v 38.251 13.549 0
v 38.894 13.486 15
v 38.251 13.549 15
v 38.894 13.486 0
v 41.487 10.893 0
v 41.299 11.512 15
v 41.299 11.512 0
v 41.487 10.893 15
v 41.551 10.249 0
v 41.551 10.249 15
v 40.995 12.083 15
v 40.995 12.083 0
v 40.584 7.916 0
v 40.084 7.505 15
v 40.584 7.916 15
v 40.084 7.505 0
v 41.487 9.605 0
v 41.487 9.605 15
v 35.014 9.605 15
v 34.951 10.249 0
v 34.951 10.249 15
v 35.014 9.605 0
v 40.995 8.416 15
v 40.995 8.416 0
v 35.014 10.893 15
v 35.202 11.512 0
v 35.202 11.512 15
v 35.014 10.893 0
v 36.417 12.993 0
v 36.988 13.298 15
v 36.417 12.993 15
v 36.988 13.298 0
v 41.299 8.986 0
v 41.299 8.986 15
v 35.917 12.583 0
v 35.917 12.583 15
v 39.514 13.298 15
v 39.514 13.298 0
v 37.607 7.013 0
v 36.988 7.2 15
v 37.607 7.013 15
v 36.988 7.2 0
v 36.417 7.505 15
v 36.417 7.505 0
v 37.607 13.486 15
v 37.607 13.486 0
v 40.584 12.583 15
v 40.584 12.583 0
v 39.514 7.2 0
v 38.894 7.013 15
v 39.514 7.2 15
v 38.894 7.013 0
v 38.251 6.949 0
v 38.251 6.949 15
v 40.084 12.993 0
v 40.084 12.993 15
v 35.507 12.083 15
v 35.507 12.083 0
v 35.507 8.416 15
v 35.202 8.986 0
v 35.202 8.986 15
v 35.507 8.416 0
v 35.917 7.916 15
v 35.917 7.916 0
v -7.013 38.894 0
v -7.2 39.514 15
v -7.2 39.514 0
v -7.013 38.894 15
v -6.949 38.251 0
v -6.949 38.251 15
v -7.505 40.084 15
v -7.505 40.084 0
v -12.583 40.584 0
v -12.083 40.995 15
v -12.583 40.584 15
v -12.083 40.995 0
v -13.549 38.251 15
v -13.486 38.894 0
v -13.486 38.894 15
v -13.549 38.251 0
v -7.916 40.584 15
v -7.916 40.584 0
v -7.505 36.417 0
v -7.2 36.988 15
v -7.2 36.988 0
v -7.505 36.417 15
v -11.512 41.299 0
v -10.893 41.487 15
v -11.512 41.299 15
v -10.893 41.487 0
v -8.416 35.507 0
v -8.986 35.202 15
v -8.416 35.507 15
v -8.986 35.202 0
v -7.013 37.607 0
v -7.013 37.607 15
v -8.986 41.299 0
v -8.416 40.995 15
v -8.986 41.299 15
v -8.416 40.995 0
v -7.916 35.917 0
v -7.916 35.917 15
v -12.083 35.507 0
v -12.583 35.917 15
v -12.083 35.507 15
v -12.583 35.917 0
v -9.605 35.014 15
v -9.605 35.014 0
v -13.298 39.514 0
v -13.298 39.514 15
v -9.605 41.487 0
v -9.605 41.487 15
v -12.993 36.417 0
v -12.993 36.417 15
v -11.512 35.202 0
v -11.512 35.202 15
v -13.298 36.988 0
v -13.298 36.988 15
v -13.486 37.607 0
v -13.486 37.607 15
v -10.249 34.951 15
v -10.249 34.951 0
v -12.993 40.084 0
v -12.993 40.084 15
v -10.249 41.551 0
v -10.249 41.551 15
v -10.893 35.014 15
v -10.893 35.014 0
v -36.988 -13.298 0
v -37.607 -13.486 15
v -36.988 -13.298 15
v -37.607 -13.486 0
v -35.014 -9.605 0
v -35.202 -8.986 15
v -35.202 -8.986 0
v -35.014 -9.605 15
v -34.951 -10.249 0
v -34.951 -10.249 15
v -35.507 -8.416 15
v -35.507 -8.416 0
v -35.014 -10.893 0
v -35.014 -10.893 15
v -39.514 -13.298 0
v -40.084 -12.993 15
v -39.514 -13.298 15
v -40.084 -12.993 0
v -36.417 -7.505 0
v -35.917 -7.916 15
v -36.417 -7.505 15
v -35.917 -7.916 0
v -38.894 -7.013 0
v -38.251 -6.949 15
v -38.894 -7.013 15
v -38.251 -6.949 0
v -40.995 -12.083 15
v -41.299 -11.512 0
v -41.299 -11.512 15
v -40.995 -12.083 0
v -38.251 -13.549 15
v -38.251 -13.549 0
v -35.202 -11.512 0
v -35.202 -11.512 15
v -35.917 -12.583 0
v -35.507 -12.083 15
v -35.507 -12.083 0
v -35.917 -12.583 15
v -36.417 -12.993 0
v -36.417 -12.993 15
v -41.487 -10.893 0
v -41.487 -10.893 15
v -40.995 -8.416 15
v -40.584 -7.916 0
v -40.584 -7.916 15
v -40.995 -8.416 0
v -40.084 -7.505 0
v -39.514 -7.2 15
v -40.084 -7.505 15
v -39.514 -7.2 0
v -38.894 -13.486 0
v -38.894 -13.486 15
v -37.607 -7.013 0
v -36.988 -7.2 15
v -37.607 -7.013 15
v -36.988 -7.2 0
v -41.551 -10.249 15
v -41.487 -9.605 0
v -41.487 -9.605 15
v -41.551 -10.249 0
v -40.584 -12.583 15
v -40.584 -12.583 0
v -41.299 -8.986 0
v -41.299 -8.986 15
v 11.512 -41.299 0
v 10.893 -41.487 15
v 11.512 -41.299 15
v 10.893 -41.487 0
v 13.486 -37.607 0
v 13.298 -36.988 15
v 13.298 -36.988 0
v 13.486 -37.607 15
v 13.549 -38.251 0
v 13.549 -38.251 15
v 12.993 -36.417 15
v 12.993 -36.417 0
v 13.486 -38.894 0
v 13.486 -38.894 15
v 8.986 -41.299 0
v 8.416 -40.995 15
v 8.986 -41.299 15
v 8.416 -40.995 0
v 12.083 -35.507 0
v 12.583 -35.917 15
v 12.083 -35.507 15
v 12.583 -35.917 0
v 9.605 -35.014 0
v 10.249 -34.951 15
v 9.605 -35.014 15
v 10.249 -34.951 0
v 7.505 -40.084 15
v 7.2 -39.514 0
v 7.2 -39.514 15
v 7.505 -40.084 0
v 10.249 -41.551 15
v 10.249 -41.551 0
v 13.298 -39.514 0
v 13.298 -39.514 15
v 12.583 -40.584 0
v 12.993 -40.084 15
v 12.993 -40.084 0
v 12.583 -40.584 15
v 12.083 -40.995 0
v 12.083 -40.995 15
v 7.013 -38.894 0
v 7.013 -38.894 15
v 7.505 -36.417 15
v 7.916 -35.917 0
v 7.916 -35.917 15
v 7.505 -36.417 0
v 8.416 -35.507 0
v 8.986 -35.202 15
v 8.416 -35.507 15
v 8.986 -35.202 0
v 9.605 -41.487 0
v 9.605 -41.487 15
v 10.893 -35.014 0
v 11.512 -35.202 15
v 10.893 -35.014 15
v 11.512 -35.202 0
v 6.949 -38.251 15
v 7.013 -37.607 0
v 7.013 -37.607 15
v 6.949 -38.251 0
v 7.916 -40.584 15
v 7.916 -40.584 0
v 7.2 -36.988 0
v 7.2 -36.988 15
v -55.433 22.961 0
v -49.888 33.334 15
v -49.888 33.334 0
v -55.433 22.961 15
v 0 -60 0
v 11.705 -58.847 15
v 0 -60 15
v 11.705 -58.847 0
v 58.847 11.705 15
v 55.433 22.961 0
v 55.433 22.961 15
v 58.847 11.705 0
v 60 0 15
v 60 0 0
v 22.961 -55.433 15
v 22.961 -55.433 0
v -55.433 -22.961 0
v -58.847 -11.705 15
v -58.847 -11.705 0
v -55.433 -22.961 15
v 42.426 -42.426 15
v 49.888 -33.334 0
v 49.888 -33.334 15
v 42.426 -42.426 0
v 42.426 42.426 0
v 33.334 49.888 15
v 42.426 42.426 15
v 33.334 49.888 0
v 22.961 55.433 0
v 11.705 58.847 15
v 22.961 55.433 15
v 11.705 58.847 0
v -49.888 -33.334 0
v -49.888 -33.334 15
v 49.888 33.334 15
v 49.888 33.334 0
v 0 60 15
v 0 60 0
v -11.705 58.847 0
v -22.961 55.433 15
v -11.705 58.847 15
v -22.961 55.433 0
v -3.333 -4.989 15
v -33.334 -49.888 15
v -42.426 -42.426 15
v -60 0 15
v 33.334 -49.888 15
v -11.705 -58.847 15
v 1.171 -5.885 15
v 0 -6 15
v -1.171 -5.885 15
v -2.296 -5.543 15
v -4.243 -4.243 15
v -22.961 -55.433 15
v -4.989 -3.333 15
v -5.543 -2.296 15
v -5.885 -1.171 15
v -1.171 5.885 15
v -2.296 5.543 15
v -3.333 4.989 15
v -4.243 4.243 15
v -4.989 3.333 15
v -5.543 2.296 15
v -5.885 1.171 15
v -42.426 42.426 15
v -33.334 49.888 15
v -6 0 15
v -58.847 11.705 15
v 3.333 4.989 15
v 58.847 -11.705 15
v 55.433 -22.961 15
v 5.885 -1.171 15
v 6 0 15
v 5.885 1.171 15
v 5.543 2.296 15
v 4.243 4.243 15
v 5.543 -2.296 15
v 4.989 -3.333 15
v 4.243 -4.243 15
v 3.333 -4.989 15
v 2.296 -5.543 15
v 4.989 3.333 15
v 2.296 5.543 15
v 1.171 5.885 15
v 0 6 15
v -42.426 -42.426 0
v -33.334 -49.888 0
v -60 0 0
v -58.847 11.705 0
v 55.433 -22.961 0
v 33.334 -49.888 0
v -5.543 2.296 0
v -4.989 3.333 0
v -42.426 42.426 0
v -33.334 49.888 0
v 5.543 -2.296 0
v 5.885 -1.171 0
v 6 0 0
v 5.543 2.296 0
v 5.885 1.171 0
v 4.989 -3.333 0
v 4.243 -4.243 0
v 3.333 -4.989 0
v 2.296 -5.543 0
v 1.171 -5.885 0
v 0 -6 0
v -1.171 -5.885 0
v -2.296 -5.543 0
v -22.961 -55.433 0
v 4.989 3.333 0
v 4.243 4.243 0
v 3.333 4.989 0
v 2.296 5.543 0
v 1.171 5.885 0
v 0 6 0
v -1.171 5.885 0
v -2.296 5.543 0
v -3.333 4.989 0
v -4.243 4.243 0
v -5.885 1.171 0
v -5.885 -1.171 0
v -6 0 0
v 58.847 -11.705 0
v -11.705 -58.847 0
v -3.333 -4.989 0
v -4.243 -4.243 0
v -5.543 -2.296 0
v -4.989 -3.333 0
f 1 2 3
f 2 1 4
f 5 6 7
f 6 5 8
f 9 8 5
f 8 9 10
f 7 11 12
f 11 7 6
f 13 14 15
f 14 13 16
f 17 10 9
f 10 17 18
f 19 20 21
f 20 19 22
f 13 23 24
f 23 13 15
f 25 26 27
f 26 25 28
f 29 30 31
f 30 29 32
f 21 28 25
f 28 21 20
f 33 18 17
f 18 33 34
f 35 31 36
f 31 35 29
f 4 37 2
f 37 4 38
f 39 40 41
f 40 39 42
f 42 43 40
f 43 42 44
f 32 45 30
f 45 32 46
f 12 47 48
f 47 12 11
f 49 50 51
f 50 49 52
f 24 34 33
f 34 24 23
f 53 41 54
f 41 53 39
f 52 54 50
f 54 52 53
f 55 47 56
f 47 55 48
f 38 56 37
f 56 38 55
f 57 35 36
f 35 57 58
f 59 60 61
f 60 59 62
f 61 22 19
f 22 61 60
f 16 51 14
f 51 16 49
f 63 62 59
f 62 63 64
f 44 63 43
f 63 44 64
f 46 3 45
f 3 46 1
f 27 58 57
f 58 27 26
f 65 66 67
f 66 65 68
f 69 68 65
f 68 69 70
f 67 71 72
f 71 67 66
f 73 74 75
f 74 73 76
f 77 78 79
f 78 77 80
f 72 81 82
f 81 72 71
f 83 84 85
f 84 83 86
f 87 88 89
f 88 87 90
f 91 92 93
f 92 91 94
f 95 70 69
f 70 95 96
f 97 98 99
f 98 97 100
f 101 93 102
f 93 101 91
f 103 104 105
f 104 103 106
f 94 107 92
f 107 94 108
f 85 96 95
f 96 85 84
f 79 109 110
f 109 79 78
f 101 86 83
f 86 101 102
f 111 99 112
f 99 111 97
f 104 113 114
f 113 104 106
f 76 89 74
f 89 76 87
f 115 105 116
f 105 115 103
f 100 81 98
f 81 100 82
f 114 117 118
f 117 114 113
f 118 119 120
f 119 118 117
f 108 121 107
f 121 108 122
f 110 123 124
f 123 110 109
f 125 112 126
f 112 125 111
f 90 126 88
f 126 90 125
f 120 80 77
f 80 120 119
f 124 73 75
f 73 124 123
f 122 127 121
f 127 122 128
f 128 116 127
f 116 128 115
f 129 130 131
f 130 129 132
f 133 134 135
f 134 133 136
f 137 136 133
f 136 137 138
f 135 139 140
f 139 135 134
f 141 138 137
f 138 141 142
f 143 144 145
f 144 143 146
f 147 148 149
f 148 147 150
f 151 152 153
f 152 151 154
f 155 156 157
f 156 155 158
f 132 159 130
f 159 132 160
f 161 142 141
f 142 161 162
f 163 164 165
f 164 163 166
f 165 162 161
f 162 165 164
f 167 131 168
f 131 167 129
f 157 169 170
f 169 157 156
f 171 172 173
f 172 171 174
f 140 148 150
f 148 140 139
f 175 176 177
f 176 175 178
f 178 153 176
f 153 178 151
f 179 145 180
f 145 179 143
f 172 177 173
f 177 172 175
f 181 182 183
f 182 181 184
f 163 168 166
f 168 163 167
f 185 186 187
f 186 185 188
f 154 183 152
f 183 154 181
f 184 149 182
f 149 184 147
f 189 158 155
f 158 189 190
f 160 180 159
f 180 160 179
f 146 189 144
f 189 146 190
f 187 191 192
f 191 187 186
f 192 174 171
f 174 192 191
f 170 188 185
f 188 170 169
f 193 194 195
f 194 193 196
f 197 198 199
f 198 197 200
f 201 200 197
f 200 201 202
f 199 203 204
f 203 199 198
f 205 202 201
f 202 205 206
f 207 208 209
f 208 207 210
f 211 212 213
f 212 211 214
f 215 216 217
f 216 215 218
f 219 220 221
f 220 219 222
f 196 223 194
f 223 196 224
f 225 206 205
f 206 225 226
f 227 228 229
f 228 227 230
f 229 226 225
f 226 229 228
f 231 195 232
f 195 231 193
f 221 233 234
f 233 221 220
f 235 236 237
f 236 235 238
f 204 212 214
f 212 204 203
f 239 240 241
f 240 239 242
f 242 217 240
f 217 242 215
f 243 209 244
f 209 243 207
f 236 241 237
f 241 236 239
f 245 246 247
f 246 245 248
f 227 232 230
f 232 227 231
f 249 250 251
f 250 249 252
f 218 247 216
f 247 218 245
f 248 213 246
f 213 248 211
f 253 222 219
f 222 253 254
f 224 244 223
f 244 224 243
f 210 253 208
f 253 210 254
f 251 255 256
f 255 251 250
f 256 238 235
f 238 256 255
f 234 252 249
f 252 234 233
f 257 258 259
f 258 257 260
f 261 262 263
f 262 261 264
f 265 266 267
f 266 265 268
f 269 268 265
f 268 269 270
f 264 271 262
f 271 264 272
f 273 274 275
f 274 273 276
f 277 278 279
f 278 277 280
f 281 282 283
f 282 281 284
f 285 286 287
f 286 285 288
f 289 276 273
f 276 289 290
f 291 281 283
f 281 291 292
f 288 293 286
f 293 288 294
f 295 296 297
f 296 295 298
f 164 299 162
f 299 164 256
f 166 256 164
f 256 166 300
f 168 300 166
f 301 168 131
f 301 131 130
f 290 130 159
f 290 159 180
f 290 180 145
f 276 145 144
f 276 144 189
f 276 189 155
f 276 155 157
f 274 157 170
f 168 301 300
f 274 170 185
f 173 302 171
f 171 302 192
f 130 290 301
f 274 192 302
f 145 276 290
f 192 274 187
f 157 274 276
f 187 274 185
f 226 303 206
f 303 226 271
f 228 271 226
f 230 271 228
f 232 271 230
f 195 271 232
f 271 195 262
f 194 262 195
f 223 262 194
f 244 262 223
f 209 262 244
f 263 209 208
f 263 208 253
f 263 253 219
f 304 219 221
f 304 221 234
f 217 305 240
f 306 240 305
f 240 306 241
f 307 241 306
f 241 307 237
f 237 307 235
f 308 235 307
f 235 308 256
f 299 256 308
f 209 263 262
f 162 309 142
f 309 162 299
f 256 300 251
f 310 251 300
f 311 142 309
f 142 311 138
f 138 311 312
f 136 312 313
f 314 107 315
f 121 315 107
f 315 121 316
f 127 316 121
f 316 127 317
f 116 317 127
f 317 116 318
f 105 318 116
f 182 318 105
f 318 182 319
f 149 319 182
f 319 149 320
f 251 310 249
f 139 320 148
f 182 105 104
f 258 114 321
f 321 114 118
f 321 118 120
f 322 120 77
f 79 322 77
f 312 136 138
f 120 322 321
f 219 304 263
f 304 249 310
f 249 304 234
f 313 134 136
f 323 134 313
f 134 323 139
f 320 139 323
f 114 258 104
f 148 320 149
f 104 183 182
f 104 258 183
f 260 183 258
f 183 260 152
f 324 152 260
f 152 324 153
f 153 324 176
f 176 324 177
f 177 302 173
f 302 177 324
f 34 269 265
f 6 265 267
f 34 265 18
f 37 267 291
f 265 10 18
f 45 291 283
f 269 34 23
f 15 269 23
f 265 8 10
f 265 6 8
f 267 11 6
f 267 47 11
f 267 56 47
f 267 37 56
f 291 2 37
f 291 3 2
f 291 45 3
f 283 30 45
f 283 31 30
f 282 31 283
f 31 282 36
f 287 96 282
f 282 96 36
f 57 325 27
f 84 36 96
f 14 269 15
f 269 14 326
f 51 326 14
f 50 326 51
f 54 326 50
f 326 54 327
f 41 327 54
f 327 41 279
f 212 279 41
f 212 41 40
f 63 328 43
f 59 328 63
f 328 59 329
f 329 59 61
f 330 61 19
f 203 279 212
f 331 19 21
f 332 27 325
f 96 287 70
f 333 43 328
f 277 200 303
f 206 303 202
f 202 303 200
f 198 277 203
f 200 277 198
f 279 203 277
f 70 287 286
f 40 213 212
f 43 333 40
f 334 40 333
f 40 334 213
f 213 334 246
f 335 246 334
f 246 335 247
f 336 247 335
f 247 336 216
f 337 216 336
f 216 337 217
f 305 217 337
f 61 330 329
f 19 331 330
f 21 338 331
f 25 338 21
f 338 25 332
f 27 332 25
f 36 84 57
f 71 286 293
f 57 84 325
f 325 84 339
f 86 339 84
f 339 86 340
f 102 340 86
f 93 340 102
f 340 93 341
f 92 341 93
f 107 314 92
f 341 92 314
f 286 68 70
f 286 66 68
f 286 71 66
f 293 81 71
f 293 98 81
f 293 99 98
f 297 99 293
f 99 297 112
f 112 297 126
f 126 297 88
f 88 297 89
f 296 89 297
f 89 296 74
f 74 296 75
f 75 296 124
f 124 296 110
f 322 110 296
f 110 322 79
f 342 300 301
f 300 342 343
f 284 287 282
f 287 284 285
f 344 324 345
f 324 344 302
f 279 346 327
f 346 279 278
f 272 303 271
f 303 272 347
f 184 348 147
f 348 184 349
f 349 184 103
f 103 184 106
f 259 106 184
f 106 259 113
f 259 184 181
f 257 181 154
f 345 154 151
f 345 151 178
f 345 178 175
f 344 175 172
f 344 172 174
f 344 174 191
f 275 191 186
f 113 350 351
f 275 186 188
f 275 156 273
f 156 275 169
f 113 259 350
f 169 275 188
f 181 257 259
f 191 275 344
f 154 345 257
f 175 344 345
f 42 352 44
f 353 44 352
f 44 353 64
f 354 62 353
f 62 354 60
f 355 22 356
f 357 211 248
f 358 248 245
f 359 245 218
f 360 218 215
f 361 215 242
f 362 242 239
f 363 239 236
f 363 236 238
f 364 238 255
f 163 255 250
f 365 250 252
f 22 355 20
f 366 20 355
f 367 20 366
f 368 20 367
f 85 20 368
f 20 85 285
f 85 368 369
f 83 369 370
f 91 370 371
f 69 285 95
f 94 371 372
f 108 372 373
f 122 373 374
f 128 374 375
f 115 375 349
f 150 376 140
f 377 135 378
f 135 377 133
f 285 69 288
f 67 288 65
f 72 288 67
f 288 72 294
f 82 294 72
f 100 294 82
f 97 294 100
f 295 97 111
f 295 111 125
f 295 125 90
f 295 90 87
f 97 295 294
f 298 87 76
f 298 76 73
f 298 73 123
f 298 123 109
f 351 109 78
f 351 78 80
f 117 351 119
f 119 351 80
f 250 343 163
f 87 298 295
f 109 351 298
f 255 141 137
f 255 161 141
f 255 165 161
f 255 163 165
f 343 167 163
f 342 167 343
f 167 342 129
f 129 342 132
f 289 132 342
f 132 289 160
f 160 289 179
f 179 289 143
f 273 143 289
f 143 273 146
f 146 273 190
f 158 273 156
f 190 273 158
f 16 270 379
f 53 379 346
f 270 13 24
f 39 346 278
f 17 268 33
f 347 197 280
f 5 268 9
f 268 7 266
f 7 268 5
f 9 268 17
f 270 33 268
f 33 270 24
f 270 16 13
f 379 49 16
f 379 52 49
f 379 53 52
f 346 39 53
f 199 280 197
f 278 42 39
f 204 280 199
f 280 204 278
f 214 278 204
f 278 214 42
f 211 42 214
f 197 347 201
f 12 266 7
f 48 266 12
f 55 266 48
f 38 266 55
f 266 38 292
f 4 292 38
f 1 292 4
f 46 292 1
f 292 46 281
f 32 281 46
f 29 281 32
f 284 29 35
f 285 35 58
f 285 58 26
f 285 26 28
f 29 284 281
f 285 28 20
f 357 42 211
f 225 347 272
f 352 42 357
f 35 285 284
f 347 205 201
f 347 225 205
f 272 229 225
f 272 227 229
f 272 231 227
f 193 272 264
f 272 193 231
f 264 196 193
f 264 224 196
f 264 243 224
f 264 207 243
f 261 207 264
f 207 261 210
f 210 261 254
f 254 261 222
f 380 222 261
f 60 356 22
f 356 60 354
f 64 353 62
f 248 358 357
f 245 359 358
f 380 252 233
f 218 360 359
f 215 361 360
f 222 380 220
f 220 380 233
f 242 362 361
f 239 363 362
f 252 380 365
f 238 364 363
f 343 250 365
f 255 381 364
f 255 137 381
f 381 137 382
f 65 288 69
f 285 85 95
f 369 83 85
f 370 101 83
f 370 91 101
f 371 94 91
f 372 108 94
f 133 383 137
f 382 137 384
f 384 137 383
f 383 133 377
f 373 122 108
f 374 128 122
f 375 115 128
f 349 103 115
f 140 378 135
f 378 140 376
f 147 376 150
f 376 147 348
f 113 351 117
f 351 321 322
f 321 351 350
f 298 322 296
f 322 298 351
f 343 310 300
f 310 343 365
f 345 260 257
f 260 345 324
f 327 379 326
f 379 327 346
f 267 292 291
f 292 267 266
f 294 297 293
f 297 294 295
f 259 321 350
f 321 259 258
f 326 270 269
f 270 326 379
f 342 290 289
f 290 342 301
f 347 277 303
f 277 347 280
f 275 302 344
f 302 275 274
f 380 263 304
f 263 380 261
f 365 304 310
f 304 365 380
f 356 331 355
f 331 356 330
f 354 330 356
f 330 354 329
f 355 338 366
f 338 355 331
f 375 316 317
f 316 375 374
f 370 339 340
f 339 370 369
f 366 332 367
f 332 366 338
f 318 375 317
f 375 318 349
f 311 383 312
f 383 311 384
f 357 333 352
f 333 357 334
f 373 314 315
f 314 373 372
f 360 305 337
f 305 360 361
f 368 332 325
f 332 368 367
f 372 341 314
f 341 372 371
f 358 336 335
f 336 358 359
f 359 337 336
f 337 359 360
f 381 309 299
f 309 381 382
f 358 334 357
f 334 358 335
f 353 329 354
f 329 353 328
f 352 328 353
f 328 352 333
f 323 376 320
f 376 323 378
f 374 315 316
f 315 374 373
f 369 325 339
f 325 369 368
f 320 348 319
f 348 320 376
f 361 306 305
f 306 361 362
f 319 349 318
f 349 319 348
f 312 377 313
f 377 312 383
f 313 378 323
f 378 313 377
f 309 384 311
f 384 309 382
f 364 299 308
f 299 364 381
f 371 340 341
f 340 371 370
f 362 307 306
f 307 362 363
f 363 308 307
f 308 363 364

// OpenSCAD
$fn = 32;

// ----------------------------------------------------------------------
// Flange Ø120 x 15
// 4 holes on a Ø79.2 bolt circle, bolted joints
// ----------------------------------------------------------------------

// --- parameters (mm) ---
flange_d = 120;  // outside diameter of the flange
thickness = 15;  // flange thickness
holes = 4;       // number of bolt holes
pcd = 79.2;      // bolt circle diameter
start_deg = 15;  // angle of the first hole, from +X
hole_d = 6.6;    // bolt hole diameter
bore_d = 12;     // central through bore
hub_d = 20;      // hub outside diameter
hub_h = 0;       // hub height above the flange face (0 = no hub)

// --- derived feature positions (mm) ---
height = thickness + hub_h;  // = 15   overall height of the part
pcd_r = pcd / 2;             // = 39.6   bolt circle radius
hole_step = 360 / holes;     // = 90   angular pitch
feature_centers = [
  [pcd_r * cos(start_deg + 0 * hole_step), pcd_r * sin(start_deg + 0 * hole_step)],
  [pcd_r * cos(start_deg + 1 * hole_step), pcd_r * sin(start_deg + 1 * hole_step)],
  [pcd_r * cos(start_deg + 2 * hole_step), pcd_r * sin(start_deg + 2 * hole_step)],
  [pcd_r * cos(start_deg + 3 * hole_step), pcd_r * sin(start_deg + 3 * hole_step)]
];   // bolt hole centres on the pitch circle

// flange disc, every hole and the bore cut straight through
difference() {
  union() {
    cylinder(d = flange_d, h = thickness);
  }
  translate([0, 0, -1]) cylinder(d = bore_d, h = height + 2);  // bore, through
  for (centre = feature_centers)
    translate([centre[0], centre[1], -1]) cylinder(d = hole_d, h = thickness + 2);
}
